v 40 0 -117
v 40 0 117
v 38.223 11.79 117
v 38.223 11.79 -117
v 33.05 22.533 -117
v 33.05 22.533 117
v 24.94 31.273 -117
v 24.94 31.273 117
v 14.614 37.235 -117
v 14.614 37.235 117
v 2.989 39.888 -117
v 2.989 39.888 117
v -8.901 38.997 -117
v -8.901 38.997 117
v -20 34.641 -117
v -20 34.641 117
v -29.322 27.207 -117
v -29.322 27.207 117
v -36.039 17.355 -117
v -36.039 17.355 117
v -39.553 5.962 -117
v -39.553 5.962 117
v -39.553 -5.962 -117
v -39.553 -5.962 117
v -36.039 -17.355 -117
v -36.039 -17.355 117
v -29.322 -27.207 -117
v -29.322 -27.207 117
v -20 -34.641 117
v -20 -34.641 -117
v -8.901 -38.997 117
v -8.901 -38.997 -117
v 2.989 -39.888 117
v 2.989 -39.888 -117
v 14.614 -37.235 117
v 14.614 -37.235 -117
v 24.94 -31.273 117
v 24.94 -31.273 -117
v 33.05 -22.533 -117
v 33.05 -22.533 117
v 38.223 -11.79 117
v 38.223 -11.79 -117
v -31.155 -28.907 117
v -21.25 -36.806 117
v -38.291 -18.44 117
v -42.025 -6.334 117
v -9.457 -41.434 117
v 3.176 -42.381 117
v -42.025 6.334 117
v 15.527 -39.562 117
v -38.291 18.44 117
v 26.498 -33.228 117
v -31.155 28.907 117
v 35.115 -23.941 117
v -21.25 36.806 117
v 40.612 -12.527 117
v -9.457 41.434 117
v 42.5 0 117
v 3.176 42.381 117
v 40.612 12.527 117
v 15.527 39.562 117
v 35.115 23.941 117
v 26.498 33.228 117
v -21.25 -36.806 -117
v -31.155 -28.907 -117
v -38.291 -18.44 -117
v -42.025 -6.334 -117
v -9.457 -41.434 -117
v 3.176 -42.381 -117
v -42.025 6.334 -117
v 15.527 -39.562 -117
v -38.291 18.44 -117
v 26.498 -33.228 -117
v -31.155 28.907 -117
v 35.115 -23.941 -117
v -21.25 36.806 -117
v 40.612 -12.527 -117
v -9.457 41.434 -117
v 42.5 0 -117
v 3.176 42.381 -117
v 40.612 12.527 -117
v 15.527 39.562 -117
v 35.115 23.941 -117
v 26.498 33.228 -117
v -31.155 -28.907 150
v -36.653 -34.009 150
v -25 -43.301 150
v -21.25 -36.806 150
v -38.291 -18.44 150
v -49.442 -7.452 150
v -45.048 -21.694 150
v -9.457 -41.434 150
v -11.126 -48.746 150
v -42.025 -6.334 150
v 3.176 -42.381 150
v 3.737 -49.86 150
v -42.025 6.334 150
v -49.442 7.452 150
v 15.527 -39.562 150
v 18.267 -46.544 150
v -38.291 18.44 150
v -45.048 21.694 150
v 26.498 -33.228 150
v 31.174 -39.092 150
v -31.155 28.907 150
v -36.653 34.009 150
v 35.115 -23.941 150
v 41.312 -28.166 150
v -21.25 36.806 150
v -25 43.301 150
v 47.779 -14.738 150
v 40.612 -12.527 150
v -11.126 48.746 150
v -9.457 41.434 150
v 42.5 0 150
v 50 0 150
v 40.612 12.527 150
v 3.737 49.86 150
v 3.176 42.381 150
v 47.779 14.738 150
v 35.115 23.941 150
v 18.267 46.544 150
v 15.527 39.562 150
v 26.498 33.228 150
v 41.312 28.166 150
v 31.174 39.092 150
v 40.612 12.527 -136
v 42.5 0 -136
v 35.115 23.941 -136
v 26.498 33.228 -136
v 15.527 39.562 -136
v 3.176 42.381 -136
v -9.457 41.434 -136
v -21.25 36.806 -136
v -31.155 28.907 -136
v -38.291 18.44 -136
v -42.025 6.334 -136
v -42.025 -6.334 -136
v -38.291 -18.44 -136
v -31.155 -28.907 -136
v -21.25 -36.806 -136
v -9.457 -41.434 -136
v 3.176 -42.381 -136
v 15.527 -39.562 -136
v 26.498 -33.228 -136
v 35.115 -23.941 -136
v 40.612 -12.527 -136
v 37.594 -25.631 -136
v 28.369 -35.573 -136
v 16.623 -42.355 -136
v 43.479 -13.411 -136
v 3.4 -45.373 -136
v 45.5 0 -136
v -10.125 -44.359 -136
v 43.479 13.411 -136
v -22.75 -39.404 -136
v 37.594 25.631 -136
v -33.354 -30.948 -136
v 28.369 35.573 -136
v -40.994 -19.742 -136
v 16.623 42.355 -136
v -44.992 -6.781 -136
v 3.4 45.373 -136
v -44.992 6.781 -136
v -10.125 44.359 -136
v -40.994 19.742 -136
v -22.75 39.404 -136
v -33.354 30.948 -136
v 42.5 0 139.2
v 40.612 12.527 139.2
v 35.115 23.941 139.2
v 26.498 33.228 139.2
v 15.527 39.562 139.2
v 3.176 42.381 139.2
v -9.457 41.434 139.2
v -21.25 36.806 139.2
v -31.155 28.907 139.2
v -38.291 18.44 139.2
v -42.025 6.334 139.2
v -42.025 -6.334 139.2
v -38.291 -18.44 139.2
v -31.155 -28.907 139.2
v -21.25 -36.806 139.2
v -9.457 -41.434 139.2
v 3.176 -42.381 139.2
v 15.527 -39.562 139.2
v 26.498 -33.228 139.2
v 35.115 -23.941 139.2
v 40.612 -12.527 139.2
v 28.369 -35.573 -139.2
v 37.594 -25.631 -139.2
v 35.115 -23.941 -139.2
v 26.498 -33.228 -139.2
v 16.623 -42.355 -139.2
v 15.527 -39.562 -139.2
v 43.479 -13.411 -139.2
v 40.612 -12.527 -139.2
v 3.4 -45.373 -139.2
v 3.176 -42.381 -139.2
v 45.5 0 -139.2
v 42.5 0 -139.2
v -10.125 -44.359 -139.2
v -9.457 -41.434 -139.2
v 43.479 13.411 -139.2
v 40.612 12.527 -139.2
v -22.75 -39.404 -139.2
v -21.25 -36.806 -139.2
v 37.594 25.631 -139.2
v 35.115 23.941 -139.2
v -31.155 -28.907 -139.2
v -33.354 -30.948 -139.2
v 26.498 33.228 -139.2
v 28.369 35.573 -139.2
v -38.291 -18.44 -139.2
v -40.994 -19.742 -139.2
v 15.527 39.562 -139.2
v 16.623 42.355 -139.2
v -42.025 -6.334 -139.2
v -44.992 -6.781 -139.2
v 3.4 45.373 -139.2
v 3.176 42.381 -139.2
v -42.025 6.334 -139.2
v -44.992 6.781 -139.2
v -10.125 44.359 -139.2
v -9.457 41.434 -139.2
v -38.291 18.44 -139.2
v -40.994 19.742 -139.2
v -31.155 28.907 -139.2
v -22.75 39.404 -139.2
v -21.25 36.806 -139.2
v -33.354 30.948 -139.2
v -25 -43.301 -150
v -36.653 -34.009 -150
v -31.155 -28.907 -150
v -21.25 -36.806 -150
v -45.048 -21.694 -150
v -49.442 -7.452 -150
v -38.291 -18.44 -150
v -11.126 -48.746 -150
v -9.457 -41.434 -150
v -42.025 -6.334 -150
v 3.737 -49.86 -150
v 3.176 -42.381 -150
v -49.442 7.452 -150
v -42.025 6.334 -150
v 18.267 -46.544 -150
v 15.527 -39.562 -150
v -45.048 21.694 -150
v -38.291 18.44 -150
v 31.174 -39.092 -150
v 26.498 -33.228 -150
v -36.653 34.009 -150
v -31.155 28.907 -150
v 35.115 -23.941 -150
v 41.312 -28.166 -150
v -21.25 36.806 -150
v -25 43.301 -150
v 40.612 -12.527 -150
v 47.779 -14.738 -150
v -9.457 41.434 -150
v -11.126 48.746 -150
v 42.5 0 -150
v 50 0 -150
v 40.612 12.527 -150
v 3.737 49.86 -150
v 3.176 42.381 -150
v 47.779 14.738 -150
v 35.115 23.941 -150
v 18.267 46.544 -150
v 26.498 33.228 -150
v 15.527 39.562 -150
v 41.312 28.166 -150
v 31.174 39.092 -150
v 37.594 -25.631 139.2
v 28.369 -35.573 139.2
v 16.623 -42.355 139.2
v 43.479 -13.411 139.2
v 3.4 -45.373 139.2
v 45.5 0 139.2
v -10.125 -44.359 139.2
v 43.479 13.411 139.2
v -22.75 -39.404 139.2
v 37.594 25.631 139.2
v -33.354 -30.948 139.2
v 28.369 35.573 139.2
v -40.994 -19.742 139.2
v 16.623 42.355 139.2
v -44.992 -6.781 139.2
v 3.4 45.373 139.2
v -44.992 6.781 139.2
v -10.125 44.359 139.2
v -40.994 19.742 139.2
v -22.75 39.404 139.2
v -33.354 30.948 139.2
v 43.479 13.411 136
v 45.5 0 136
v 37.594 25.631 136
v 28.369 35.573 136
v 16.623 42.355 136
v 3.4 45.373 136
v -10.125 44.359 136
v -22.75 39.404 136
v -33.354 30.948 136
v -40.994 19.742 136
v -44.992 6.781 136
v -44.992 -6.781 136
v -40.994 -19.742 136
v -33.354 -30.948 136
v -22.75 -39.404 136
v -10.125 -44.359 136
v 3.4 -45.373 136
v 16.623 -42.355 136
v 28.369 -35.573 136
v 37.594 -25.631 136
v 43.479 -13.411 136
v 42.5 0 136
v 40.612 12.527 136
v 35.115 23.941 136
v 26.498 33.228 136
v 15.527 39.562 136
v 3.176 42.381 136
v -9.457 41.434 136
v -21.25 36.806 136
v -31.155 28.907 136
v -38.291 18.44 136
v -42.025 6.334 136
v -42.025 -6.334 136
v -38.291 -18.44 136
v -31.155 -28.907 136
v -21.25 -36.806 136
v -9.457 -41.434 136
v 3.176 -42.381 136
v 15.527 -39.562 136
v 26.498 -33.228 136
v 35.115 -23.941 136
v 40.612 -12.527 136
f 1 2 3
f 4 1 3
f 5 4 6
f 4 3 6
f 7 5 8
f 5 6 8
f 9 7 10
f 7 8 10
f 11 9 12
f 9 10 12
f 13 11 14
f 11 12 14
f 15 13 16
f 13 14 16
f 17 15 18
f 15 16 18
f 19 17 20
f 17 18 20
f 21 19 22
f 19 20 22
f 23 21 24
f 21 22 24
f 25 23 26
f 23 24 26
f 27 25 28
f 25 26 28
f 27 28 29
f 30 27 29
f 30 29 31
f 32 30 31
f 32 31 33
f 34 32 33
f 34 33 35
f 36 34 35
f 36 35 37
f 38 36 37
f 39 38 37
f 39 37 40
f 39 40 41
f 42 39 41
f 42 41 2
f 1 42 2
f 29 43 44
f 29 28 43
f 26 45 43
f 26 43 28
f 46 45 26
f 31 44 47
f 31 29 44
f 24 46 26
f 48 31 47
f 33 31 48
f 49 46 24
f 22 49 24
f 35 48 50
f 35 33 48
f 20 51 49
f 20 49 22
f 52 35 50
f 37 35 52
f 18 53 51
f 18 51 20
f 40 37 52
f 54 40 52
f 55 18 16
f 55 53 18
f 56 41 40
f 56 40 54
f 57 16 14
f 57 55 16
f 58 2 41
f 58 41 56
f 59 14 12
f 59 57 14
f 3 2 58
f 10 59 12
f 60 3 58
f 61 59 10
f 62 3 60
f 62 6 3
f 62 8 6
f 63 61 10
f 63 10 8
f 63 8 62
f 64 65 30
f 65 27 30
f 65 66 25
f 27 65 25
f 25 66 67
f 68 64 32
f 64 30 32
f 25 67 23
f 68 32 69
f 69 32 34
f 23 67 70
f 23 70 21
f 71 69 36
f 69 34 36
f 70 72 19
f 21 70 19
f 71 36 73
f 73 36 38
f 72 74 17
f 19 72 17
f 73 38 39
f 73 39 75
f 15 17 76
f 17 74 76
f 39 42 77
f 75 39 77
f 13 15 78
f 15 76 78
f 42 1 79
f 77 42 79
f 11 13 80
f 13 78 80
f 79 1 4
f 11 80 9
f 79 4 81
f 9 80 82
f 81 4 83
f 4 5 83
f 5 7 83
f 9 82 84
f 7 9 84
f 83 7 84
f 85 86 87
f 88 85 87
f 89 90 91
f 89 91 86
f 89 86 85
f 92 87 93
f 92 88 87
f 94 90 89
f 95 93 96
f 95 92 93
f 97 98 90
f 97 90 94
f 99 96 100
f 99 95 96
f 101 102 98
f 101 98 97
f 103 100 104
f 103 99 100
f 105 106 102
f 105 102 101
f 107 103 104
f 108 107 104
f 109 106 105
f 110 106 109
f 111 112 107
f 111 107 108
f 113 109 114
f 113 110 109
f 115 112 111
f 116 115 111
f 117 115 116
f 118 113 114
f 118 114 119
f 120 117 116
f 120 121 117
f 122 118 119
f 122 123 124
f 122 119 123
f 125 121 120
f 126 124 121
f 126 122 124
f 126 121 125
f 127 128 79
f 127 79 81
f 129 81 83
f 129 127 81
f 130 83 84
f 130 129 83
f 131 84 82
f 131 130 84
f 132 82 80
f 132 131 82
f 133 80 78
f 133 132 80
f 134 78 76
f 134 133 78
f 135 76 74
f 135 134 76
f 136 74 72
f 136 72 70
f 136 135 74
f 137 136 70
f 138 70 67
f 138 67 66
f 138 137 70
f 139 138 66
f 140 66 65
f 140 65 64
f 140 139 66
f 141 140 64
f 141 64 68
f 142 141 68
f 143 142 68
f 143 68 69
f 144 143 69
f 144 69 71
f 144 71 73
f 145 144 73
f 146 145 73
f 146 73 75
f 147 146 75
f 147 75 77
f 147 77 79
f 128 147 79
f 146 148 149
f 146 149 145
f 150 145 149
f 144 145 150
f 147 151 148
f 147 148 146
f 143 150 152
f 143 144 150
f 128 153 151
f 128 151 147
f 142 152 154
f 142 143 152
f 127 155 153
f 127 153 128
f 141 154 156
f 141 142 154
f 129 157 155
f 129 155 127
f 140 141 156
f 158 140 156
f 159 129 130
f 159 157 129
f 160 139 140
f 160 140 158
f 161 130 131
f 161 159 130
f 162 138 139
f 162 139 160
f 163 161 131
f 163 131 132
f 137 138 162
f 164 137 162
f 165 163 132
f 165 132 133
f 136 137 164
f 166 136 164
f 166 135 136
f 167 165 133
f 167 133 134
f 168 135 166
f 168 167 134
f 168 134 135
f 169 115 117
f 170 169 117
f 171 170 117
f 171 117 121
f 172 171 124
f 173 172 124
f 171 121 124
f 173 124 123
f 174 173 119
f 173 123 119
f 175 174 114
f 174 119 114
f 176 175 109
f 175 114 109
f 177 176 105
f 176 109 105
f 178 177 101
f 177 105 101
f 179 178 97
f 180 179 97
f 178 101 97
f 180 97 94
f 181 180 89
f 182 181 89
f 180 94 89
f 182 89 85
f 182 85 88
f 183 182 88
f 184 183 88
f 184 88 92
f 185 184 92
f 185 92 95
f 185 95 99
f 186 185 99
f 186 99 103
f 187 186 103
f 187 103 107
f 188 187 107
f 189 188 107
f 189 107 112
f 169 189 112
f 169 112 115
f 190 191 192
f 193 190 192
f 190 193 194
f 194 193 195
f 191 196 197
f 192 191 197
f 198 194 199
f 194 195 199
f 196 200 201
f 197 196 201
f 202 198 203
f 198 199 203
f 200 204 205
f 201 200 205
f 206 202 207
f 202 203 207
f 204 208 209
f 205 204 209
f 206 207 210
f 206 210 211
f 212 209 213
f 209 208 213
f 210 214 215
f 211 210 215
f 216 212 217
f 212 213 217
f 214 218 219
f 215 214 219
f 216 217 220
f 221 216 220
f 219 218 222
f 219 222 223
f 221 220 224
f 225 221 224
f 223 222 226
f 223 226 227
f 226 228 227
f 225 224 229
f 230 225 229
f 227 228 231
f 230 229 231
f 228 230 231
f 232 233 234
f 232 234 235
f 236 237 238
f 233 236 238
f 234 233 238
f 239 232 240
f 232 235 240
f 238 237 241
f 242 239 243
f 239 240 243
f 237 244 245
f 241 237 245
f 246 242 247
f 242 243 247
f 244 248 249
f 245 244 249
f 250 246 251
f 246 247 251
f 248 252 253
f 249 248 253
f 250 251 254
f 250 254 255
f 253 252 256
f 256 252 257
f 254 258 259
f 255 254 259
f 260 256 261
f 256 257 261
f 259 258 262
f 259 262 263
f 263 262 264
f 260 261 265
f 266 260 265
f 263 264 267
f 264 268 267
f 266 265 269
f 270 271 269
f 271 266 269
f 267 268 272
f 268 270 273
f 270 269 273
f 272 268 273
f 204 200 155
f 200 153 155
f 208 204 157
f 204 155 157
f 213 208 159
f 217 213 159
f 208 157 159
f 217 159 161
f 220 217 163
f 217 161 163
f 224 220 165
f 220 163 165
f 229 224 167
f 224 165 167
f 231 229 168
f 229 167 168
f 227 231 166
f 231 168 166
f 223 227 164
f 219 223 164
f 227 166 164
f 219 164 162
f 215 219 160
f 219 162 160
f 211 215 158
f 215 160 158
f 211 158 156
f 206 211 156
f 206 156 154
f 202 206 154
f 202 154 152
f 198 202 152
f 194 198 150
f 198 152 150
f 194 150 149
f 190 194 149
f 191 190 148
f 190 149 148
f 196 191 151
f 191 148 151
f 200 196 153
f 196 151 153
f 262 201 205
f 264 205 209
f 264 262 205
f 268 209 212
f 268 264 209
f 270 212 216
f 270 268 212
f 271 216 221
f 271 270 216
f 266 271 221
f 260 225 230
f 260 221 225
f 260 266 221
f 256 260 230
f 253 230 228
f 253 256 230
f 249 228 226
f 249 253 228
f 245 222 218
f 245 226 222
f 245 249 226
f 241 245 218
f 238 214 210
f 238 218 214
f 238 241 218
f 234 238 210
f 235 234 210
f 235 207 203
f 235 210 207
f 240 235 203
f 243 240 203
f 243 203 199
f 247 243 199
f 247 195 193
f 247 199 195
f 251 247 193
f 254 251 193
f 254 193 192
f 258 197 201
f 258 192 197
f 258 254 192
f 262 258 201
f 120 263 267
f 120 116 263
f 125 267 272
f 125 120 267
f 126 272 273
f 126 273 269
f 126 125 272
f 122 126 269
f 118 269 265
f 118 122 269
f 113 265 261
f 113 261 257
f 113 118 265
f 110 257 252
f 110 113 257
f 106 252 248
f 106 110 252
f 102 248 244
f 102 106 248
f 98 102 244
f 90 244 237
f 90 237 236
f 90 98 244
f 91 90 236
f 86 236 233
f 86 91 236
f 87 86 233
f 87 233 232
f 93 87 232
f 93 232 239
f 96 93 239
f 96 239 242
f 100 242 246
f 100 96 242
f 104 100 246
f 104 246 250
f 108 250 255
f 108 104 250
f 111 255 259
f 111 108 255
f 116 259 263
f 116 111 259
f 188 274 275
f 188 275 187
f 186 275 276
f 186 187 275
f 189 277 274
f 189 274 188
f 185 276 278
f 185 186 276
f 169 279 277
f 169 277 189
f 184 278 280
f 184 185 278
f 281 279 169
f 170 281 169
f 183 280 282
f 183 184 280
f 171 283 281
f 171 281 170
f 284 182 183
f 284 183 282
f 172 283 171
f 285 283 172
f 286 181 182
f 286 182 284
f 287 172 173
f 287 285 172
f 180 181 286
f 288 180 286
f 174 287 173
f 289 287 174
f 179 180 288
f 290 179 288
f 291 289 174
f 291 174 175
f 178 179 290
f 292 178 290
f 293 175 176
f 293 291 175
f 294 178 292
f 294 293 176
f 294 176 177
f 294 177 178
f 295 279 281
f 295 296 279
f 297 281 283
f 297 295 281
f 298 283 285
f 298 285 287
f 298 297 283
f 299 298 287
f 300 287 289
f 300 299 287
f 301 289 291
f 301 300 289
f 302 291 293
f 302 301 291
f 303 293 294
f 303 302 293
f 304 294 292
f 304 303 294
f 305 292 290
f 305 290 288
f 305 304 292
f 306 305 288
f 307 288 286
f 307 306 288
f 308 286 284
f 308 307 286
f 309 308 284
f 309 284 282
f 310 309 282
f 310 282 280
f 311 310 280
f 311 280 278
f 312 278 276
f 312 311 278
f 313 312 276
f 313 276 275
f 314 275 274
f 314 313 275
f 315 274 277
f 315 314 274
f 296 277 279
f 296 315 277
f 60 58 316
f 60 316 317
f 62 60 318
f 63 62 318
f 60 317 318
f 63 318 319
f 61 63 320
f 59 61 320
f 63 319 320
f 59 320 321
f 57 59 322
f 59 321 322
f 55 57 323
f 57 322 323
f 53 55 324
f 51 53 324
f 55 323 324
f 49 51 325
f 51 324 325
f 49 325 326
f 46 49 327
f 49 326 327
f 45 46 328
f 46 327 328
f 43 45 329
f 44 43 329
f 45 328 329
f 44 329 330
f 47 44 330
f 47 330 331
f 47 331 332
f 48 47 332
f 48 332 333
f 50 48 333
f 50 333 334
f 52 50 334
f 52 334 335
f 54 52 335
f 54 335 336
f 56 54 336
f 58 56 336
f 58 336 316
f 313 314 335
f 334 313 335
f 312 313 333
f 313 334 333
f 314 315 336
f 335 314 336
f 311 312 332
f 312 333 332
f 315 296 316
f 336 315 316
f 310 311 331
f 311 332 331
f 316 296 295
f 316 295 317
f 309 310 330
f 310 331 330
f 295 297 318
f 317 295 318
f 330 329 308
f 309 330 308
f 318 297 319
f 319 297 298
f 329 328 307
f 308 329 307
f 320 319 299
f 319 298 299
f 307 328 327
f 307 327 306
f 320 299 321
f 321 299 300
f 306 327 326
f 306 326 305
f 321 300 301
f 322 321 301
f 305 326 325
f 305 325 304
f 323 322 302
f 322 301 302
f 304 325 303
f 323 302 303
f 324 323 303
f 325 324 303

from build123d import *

# Parameters (mm, degrees)
SKETCH1_R           = 50
BOSS_EXTRUDE1_DEPTH = 150
SKETCH2_R           = 42.5
CUT_EXTRUDE1_DEPTH  = 33
SKETCH3_R           = 40
CUT_EXTRUDE2_DEPTH  = 277.204634284
SKETCH4_W           = 10
SKETCH4_H           = 3.2


with BuildPart() as part:
    # Sketch1 → Boss-Extrude1 (new, symmetric)
    with BuildSketch(Plane.XY):
        Circle(SKETCH1_R)
    extrude(amount=BOSS_EXTRUDE1_DEPTH, both=True)

    # Sketch2 → Cut-Extrude1 (cut)
    with BuildSketch(Plane.XY.offset(150)):
        Circle(SKETCH2_R)
    cut_extrude1 = extrude(amount=-CUT_EXTRUDE1_DEPTH, mode=Mode.SUBTRACT)

    # Sketch3 → Cut-Extrude2 (cut, through all)
    with BuildSketch(Plane.XY.offset(117)):
        Circle(SKETCH3_R)
    cut_extrude2 = extrude(amount=-CUT_EXTRUDE2_DEPTH, mode=Mode.SUBTRACT)

    # Sketch4 → Cut-Revolve1 (revolve, cut)
    with BuildSketch(Plane(origin=(0, 0, 0), x_dir=(1, 0, 0), z_dir=(0, 1, 0))):
        with Locations((40.5, -137.6)):
            Rectangle(SKETCH4_W, SKETCH4_H)
    cut_revolve1 = revolve(axis=Axis((0, 0, 150), (0, 0, 1)), mode=Mode.SUBTRACT)

    # Mirror1: Cut-Extrude1, Cut-Extrude2, Cut-Revolve1 across plane
    add(cut_extrude1.mirror(Plane.XY), mode=Mode.SUBTRACT)
    add(cut_extrude2.mirror(Plane.XY), mode=Mode.SUBTRACT)
    add(cut_revolve1.mirror(Plane.XY), mode=Mode.SUBTRACT)


solid = part.part
